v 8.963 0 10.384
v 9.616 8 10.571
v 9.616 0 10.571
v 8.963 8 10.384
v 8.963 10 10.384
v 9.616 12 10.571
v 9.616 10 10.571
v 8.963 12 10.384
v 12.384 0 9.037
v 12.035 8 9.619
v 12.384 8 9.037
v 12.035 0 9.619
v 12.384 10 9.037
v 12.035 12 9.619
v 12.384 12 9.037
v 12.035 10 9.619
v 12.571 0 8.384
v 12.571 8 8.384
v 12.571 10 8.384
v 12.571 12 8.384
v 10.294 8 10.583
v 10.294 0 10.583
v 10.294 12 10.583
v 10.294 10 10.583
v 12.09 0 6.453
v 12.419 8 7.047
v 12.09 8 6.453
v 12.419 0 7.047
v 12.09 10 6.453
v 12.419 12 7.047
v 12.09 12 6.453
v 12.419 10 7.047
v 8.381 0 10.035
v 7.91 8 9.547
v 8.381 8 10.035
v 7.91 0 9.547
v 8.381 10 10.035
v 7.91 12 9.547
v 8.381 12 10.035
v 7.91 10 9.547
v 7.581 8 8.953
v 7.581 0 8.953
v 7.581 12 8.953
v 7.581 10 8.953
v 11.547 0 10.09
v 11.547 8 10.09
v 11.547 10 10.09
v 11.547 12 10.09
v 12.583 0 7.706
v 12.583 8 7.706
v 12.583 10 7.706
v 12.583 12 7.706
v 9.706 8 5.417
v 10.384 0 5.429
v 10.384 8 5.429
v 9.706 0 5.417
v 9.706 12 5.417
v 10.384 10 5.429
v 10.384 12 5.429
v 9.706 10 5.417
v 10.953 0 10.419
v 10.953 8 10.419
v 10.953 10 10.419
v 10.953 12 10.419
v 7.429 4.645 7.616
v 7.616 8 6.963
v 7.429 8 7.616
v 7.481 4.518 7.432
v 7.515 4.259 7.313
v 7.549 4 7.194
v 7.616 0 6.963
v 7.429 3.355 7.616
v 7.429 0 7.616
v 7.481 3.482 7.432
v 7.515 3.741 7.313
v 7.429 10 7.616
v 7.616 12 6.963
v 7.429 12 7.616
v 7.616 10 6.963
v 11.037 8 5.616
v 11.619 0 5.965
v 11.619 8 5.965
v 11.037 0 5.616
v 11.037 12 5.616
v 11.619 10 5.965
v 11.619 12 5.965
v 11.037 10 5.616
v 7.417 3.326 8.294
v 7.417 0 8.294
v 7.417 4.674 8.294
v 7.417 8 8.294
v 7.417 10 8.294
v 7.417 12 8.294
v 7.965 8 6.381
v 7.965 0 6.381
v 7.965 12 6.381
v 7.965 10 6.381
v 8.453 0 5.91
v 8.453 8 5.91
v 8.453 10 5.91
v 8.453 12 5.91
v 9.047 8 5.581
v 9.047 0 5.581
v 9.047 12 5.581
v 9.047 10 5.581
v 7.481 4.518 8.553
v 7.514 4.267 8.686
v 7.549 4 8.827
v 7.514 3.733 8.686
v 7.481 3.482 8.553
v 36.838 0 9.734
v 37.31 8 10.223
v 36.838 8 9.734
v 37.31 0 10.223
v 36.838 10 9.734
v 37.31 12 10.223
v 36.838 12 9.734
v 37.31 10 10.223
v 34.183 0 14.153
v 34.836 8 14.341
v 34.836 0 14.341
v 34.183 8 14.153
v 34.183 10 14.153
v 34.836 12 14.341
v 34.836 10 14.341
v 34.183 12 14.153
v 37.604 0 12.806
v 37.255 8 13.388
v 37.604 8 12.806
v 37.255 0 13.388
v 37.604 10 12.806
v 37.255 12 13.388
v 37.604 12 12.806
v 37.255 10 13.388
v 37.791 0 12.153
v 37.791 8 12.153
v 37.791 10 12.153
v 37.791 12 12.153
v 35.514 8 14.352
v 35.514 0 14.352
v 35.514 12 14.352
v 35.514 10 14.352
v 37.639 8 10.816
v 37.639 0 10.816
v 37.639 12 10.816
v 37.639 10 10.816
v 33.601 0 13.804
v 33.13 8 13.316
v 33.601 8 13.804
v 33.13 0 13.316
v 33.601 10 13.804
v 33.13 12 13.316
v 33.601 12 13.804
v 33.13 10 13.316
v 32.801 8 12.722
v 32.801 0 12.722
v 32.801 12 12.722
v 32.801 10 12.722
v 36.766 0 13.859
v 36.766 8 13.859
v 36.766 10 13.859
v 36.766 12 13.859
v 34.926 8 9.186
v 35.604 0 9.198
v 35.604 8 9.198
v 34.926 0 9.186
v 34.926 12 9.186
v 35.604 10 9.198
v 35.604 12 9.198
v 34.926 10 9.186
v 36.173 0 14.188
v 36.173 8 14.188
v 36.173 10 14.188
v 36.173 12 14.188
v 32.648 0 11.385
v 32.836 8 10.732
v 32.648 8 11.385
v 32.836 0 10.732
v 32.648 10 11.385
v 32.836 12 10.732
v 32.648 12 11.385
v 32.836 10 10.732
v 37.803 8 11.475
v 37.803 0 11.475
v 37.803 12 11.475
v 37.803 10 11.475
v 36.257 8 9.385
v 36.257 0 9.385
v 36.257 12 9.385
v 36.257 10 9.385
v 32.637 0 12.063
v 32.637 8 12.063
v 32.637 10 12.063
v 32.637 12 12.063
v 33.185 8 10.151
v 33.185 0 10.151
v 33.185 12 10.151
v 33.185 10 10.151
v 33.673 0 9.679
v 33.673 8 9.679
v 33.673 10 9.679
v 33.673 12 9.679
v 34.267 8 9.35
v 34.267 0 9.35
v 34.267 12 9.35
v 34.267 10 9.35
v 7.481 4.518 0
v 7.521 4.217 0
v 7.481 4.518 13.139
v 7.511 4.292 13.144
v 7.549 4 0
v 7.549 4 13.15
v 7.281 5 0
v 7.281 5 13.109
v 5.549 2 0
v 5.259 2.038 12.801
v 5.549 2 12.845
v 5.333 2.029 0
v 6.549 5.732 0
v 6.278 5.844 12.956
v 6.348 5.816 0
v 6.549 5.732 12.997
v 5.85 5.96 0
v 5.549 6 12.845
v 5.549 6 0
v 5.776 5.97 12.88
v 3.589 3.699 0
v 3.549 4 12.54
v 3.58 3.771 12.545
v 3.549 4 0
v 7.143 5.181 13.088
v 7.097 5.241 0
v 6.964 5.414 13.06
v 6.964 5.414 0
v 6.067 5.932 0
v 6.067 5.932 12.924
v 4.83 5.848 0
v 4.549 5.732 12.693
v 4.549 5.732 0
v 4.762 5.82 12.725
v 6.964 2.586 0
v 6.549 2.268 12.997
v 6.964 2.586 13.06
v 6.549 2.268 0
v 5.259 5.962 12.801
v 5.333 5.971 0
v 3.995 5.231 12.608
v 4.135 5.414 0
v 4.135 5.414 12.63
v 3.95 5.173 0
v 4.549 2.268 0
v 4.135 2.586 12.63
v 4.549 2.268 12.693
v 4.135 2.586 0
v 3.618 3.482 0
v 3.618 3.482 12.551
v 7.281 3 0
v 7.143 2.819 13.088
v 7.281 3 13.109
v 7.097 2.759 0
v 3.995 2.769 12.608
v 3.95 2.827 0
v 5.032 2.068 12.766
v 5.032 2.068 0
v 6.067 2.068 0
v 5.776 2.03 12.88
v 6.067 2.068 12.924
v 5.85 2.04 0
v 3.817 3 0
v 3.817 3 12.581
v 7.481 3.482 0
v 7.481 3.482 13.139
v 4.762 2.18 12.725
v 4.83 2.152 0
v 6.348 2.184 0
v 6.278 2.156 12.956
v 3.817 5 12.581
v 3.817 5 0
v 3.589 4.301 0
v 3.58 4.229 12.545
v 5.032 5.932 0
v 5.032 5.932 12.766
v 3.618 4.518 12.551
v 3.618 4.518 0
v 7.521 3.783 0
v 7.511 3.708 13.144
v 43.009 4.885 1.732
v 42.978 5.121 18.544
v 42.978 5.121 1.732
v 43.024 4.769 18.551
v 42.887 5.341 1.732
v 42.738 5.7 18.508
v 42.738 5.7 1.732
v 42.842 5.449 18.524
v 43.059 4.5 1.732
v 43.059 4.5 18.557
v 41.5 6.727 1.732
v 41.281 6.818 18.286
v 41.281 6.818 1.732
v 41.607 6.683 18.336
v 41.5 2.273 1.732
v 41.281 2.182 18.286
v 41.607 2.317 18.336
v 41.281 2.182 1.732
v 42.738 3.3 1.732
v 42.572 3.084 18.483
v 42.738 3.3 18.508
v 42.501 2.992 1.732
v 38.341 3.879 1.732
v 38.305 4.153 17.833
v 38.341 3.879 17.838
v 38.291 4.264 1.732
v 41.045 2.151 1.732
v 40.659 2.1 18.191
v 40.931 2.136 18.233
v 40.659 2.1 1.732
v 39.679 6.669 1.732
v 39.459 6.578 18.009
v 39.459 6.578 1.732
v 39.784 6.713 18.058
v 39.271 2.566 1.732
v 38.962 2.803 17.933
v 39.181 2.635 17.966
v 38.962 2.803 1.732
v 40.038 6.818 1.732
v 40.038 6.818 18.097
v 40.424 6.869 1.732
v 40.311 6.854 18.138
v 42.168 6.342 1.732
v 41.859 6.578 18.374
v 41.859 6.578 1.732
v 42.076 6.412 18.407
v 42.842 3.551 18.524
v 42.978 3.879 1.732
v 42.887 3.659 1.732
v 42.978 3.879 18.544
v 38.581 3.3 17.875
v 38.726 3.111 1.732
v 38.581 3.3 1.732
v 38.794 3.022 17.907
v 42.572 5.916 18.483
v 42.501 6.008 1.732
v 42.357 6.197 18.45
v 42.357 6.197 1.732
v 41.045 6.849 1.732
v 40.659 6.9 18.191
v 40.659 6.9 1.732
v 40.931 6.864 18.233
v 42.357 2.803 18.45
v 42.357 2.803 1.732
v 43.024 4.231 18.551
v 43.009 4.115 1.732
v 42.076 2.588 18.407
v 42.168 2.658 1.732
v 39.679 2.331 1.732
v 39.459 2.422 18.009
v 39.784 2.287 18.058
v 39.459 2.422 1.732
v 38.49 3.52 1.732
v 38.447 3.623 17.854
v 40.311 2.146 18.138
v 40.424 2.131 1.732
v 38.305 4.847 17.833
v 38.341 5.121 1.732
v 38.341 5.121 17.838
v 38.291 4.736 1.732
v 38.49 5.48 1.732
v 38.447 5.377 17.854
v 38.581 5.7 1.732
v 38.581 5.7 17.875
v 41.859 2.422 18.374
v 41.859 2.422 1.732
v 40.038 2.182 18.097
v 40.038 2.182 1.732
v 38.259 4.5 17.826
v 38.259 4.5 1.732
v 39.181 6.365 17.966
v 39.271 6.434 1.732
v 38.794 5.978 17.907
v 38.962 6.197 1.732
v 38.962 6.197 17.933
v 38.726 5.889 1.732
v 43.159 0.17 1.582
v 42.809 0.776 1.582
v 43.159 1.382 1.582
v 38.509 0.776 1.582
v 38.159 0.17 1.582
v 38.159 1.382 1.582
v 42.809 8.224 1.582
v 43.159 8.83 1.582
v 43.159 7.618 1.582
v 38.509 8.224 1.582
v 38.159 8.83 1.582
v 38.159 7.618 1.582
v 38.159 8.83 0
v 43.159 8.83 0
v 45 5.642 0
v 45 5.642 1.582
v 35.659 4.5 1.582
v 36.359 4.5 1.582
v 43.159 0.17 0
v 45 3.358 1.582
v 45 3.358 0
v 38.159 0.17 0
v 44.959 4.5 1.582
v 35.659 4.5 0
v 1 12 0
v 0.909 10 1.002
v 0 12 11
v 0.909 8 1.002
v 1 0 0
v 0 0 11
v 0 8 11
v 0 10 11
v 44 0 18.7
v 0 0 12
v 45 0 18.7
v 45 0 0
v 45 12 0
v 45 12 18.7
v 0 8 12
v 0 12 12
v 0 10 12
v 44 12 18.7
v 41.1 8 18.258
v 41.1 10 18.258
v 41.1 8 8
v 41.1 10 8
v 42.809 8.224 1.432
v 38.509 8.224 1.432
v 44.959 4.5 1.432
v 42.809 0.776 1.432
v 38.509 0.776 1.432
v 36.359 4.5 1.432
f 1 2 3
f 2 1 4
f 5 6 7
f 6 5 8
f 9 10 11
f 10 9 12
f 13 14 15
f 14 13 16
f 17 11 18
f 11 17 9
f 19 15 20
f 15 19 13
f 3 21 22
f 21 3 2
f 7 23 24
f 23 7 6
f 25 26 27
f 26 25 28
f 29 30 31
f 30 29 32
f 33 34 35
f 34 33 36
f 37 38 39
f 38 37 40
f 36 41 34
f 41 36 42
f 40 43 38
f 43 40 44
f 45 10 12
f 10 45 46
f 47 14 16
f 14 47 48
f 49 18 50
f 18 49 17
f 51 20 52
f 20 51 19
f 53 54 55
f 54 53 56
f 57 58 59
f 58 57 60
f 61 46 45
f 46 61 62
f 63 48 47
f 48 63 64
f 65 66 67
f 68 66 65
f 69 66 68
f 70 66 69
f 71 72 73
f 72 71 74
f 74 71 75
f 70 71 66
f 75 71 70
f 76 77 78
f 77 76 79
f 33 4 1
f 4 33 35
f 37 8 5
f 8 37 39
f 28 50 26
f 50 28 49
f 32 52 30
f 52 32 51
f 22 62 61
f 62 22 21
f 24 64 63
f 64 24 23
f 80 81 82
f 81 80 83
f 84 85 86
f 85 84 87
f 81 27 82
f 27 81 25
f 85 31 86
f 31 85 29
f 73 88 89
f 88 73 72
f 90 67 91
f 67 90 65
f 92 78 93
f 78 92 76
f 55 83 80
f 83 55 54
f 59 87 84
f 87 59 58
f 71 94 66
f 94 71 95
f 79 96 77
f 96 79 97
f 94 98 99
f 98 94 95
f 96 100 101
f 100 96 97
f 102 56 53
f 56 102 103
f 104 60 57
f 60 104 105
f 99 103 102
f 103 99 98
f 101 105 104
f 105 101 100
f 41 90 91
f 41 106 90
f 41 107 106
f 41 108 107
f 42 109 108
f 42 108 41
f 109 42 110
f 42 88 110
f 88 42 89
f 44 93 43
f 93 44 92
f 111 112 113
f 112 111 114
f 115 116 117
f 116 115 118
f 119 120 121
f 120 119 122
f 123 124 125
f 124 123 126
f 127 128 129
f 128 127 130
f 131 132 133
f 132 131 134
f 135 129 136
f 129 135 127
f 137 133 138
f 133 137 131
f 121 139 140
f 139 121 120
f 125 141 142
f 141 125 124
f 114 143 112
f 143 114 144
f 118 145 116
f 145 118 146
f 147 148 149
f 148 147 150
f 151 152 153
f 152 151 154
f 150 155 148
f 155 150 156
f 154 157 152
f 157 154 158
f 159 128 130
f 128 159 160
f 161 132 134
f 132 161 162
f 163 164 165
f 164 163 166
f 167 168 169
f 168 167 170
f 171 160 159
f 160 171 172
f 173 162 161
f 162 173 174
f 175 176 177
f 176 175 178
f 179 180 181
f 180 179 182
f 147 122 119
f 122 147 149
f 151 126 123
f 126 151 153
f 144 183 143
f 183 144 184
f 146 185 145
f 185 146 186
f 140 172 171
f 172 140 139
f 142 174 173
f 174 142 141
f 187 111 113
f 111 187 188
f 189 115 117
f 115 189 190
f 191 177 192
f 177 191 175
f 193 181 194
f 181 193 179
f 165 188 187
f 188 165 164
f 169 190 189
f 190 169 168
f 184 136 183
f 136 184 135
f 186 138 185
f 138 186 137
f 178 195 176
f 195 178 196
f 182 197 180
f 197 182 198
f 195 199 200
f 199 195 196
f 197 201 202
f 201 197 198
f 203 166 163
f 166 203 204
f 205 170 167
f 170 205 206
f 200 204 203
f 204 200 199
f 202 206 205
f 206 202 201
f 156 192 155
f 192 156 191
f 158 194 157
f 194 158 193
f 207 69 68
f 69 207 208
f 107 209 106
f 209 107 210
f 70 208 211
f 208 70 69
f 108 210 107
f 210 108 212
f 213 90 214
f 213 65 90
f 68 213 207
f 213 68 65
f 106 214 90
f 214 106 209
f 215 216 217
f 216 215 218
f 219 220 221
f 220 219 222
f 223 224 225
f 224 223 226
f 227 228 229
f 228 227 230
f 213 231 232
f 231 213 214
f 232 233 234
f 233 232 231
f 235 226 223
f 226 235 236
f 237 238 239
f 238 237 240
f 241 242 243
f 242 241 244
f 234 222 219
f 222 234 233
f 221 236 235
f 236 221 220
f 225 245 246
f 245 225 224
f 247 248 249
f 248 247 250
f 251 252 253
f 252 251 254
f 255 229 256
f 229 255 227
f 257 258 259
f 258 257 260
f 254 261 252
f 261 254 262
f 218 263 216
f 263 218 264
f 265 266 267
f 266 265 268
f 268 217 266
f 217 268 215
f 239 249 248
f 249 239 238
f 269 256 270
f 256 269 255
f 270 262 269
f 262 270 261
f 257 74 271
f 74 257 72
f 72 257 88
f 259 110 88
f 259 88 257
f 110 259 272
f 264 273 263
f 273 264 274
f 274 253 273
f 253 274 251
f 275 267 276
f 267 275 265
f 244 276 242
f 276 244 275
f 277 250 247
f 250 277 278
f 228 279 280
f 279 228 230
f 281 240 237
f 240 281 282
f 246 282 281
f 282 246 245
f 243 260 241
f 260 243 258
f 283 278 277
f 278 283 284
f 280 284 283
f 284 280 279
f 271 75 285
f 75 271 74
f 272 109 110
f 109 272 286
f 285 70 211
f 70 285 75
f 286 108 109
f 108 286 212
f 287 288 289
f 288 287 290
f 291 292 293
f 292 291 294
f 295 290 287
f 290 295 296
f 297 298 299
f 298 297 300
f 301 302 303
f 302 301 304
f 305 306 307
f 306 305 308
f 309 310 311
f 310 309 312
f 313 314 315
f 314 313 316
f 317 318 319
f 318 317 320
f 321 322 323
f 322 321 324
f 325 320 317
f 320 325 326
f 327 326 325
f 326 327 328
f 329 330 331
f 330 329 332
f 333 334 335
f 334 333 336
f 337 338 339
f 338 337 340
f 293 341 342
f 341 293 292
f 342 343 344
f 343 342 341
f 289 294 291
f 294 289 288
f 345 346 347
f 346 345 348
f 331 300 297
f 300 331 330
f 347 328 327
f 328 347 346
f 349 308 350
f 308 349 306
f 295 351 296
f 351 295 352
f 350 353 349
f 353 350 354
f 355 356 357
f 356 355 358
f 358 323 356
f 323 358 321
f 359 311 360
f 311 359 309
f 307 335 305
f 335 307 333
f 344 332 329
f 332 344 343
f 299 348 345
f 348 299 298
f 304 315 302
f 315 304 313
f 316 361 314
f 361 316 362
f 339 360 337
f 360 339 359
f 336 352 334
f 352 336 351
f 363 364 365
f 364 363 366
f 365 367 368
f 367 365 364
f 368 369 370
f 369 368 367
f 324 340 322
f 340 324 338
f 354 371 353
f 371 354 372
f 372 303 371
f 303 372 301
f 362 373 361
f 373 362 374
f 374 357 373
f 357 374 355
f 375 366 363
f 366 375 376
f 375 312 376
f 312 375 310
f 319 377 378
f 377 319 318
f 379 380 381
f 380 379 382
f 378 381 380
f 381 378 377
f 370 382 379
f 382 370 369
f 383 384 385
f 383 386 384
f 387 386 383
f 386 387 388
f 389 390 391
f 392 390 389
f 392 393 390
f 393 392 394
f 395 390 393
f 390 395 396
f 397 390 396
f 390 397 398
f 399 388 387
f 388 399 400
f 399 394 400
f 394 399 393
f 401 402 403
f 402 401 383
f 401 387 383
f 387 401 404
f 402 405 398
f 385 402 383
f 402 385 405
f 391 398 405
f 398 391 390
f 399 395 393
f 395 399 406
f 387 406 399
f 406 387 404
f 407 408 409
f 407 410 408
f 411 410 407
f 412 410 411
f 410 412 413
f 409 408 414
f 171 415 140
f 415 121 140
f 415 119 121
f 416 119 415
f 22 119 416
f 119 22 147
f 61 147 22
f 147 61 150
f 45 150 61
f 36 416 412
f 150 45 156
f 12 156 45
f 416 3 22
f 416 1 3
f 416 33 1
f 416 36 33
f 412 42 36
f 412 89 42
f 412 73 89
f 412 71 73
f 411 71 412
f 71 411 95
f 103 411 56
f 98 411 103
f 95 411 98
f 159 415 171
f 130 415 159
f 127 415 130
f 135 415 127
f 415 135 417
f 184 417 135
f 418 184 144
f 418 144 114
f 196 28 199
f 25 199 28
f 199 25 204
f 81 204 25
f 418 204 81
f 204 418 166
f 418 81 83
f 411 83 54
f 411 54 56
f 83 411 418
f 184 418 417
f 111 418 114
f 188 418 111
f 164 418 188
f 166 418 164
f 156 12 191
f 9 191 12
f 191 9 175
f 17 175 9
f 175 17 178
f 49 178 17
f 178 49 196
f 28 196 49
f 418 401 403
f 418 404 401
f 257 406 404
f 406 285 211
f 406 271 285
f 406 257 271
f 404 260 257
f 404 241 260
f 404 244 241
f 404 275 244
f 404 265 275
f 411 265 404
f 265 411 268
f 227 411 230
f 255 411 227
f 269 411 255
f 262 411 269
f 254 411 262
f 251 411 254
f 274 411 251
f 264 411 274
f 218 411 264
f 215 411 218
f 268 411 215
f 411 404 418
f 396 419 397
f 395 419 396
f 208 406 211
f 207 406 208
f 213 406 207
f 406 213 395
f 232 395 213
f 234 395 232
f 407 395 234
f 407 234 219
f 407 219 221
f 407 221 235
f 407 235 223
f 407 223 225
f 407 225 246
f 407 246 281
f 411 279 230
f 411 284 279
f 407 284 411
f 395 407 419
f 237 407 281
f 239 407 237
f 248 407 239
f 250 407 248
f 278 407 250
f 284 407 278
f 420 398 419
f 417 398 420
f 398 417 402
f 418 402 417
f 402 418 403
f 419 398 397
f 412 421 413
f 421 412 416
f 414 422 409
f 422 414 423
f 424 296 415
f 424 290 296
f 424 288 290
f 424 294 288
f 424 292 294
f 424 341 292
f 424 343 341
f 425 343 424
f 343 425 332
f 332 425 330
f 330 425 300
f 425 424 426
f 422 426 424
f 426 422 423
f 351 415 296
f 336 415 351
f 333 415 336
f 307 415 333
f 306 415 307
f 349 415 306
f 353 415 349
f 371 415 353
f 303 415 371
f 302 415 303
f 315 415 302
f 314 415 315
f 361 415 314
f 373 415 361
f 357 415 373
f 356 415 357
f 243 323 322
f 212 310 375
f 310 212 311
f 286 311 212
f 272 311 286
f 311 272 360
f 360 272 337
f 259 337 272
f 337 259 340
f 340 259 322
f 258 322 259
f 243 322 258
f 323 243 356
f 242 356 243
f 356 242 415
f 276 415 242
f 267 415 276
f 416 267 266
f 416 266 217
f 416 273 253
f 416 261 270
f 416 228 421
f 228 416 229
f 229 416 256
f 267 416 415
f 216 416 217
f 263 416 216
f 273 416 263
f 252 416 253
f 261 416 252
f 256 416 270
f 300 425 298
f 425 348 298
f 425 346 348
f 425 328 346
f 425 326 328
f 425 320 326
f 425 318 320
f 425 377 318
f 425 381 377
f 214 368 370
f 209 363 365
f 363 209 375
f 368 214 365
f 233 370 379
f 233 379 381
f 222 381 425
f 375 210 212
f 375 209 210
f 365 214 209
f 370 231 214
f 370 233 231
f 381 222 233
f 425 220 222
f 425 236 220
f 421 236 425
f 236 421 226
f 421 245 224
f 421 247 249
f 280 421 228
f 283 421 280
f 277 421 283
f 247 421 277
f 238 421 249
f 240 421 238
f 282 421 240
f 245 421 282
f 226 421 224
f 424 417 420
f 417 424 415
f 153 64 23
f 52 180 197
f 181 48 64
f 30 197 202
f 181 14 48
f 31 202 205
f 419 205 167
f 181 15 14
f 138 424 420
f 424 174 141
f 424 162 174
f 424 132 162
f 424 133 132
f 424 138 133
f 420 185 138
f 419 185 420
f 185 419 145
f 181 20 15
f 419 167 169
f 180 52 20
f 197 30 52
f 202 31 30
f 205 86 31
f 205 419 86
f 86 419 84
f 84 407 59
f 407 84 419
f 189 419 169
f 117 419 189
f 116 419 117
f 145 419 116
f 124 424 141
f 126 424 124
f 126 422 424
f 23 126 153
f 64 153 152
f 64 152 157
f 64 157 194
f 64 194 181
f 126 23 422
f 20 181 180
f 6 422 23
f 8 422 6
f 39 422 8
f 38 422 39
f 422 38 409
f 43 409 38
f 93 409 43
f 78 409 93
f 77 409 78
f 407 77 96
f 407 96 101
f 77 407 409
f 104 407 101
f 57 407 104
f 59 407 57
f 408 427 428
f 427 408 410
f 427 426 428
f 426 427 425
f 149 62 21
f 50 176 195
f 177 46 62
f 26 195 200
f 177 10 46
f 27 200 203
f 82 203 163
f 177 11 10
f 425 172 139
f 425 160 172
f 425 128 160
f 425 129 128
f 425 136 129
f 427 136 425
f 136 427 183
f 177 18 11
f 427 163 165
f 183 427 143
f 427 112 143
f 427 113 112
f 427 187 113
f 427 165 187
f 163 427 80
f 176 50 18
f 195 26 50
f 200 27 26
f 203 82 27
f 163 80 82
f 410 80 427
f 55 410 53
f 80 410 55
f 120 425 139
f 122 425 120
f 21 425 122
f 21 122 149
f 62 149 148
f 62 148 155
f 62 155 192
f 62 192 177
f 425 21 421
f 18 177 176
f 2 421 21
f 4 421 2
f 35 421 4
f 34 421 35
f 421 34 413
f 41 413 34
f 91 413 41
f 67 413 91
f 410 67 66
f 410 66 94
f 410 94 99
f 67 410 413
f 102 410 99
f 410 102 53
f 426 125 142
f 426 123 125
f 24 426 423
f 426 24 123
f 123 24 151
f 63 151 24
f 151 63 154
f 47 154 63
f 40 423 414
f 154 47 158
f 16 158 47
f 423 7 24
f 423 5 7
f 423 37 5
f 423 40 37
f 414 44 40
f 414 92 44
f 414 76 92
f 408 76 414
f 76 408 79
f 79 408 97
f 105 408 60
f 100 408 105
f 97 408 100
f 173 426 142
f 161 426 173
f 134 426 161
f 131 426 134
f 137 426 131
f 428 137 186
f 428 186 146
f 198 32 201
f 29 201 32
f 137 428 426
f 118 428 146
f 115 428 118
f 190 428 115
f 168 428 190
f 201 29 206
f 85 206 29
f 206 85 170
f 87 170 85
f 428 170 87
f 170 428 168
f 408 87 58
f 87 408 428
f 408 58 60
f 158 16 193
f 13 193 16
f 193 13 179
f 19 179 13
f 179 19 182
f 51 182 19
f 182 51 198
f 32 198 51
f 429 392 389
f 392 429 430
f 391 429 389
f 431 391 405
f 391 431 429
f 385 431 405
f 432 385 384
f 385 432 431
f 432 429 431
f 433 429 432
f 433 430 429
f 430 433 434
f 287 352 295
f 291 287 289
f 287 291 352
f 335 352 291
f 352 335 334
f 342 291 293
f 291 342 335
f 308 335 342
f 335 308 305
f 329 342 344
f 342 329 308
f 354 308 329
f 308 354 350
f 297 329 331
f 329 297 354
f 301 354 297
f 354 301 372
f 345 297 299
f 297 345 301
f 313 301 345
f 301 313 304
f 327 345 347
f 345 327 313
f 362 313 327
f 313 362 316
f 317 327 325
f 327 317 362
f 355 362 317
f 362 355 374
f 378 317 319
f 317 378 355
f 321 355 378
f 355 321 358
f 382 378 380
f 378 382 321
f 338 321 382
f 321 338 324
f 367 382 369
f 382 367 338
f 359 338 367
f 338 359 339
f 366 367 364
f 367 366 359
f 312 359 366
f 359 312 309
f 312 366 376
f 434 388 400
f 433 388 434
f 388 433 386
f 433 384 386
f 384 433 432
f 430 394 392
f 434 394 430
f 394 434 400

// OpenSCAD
// FFF extruder using geared stepper motor http://www.2engineers.com/shop/motor-1/
// Designed by OhmEye (github.com/OhmEye)
// uses blddk hobb, 605zz bearing, 2x3/8" corner brace from Ace hardware, and some fasteners.
// Copyright 2012 OhmEye, James L Paul
// Licensed GPLv3

module lever(){

$HEIGHT=11;
$THICK=12;

difference(){

hull(){
translate([0,0,$HEIGHT])cube([1,$THICK,1]);
translate([1,0,0])cube([1,$THICK,1]);
translate([44,0,0.7])cube([1,$THICK,7+$HEIGHT]);
translate([44,0,0])cube([1,$THICK,1]);
}

hull(){
translate([-0.1,$THICK-4,$HEIGHT-10])cube([1,2,30]);
translate([40.1,$THICK-4,$HEIGHT-3])cube([1,2,37]);
}

translate([10,0,8])rotate([0,-8.5,0])holes();
}
translate([10,0,13])rotate([0,-8.5,0])translate([31,4.5,0])rotate([0,8.5,0])translate([0,0,-16])cylinder(r=4.3,h=0.3,$fn=6,center=true);

module holes() {
rotate([90,0,0])cylinder(r=2.6,h=30,$fn=24,center=true);
translate([25.5,0,0])rotate([90,0,0])cylinder(r=2.6,h=30,$fn=24,center=true);

translate([0-4.5,4,0])rotate([0,8.5,0])cylinder(r=2,h=90,$fn=24,center=true);
translate([31,4.5,0])rotate([0,8.5,0])cylinder(r=2.4,h=90,$fn=24,center=true);
translate([31,4.5,0])rotate([0,8.5,0])translate([0,0,-16])cylinder(r=5,h=10,$fn=6,center=true);
//translate([31,4.5,0])rotate([0,8.5,0])translate([0,0,-16])cylinder(r=5,h=0.3,$fn=6,center=true);
}



}

lever();
